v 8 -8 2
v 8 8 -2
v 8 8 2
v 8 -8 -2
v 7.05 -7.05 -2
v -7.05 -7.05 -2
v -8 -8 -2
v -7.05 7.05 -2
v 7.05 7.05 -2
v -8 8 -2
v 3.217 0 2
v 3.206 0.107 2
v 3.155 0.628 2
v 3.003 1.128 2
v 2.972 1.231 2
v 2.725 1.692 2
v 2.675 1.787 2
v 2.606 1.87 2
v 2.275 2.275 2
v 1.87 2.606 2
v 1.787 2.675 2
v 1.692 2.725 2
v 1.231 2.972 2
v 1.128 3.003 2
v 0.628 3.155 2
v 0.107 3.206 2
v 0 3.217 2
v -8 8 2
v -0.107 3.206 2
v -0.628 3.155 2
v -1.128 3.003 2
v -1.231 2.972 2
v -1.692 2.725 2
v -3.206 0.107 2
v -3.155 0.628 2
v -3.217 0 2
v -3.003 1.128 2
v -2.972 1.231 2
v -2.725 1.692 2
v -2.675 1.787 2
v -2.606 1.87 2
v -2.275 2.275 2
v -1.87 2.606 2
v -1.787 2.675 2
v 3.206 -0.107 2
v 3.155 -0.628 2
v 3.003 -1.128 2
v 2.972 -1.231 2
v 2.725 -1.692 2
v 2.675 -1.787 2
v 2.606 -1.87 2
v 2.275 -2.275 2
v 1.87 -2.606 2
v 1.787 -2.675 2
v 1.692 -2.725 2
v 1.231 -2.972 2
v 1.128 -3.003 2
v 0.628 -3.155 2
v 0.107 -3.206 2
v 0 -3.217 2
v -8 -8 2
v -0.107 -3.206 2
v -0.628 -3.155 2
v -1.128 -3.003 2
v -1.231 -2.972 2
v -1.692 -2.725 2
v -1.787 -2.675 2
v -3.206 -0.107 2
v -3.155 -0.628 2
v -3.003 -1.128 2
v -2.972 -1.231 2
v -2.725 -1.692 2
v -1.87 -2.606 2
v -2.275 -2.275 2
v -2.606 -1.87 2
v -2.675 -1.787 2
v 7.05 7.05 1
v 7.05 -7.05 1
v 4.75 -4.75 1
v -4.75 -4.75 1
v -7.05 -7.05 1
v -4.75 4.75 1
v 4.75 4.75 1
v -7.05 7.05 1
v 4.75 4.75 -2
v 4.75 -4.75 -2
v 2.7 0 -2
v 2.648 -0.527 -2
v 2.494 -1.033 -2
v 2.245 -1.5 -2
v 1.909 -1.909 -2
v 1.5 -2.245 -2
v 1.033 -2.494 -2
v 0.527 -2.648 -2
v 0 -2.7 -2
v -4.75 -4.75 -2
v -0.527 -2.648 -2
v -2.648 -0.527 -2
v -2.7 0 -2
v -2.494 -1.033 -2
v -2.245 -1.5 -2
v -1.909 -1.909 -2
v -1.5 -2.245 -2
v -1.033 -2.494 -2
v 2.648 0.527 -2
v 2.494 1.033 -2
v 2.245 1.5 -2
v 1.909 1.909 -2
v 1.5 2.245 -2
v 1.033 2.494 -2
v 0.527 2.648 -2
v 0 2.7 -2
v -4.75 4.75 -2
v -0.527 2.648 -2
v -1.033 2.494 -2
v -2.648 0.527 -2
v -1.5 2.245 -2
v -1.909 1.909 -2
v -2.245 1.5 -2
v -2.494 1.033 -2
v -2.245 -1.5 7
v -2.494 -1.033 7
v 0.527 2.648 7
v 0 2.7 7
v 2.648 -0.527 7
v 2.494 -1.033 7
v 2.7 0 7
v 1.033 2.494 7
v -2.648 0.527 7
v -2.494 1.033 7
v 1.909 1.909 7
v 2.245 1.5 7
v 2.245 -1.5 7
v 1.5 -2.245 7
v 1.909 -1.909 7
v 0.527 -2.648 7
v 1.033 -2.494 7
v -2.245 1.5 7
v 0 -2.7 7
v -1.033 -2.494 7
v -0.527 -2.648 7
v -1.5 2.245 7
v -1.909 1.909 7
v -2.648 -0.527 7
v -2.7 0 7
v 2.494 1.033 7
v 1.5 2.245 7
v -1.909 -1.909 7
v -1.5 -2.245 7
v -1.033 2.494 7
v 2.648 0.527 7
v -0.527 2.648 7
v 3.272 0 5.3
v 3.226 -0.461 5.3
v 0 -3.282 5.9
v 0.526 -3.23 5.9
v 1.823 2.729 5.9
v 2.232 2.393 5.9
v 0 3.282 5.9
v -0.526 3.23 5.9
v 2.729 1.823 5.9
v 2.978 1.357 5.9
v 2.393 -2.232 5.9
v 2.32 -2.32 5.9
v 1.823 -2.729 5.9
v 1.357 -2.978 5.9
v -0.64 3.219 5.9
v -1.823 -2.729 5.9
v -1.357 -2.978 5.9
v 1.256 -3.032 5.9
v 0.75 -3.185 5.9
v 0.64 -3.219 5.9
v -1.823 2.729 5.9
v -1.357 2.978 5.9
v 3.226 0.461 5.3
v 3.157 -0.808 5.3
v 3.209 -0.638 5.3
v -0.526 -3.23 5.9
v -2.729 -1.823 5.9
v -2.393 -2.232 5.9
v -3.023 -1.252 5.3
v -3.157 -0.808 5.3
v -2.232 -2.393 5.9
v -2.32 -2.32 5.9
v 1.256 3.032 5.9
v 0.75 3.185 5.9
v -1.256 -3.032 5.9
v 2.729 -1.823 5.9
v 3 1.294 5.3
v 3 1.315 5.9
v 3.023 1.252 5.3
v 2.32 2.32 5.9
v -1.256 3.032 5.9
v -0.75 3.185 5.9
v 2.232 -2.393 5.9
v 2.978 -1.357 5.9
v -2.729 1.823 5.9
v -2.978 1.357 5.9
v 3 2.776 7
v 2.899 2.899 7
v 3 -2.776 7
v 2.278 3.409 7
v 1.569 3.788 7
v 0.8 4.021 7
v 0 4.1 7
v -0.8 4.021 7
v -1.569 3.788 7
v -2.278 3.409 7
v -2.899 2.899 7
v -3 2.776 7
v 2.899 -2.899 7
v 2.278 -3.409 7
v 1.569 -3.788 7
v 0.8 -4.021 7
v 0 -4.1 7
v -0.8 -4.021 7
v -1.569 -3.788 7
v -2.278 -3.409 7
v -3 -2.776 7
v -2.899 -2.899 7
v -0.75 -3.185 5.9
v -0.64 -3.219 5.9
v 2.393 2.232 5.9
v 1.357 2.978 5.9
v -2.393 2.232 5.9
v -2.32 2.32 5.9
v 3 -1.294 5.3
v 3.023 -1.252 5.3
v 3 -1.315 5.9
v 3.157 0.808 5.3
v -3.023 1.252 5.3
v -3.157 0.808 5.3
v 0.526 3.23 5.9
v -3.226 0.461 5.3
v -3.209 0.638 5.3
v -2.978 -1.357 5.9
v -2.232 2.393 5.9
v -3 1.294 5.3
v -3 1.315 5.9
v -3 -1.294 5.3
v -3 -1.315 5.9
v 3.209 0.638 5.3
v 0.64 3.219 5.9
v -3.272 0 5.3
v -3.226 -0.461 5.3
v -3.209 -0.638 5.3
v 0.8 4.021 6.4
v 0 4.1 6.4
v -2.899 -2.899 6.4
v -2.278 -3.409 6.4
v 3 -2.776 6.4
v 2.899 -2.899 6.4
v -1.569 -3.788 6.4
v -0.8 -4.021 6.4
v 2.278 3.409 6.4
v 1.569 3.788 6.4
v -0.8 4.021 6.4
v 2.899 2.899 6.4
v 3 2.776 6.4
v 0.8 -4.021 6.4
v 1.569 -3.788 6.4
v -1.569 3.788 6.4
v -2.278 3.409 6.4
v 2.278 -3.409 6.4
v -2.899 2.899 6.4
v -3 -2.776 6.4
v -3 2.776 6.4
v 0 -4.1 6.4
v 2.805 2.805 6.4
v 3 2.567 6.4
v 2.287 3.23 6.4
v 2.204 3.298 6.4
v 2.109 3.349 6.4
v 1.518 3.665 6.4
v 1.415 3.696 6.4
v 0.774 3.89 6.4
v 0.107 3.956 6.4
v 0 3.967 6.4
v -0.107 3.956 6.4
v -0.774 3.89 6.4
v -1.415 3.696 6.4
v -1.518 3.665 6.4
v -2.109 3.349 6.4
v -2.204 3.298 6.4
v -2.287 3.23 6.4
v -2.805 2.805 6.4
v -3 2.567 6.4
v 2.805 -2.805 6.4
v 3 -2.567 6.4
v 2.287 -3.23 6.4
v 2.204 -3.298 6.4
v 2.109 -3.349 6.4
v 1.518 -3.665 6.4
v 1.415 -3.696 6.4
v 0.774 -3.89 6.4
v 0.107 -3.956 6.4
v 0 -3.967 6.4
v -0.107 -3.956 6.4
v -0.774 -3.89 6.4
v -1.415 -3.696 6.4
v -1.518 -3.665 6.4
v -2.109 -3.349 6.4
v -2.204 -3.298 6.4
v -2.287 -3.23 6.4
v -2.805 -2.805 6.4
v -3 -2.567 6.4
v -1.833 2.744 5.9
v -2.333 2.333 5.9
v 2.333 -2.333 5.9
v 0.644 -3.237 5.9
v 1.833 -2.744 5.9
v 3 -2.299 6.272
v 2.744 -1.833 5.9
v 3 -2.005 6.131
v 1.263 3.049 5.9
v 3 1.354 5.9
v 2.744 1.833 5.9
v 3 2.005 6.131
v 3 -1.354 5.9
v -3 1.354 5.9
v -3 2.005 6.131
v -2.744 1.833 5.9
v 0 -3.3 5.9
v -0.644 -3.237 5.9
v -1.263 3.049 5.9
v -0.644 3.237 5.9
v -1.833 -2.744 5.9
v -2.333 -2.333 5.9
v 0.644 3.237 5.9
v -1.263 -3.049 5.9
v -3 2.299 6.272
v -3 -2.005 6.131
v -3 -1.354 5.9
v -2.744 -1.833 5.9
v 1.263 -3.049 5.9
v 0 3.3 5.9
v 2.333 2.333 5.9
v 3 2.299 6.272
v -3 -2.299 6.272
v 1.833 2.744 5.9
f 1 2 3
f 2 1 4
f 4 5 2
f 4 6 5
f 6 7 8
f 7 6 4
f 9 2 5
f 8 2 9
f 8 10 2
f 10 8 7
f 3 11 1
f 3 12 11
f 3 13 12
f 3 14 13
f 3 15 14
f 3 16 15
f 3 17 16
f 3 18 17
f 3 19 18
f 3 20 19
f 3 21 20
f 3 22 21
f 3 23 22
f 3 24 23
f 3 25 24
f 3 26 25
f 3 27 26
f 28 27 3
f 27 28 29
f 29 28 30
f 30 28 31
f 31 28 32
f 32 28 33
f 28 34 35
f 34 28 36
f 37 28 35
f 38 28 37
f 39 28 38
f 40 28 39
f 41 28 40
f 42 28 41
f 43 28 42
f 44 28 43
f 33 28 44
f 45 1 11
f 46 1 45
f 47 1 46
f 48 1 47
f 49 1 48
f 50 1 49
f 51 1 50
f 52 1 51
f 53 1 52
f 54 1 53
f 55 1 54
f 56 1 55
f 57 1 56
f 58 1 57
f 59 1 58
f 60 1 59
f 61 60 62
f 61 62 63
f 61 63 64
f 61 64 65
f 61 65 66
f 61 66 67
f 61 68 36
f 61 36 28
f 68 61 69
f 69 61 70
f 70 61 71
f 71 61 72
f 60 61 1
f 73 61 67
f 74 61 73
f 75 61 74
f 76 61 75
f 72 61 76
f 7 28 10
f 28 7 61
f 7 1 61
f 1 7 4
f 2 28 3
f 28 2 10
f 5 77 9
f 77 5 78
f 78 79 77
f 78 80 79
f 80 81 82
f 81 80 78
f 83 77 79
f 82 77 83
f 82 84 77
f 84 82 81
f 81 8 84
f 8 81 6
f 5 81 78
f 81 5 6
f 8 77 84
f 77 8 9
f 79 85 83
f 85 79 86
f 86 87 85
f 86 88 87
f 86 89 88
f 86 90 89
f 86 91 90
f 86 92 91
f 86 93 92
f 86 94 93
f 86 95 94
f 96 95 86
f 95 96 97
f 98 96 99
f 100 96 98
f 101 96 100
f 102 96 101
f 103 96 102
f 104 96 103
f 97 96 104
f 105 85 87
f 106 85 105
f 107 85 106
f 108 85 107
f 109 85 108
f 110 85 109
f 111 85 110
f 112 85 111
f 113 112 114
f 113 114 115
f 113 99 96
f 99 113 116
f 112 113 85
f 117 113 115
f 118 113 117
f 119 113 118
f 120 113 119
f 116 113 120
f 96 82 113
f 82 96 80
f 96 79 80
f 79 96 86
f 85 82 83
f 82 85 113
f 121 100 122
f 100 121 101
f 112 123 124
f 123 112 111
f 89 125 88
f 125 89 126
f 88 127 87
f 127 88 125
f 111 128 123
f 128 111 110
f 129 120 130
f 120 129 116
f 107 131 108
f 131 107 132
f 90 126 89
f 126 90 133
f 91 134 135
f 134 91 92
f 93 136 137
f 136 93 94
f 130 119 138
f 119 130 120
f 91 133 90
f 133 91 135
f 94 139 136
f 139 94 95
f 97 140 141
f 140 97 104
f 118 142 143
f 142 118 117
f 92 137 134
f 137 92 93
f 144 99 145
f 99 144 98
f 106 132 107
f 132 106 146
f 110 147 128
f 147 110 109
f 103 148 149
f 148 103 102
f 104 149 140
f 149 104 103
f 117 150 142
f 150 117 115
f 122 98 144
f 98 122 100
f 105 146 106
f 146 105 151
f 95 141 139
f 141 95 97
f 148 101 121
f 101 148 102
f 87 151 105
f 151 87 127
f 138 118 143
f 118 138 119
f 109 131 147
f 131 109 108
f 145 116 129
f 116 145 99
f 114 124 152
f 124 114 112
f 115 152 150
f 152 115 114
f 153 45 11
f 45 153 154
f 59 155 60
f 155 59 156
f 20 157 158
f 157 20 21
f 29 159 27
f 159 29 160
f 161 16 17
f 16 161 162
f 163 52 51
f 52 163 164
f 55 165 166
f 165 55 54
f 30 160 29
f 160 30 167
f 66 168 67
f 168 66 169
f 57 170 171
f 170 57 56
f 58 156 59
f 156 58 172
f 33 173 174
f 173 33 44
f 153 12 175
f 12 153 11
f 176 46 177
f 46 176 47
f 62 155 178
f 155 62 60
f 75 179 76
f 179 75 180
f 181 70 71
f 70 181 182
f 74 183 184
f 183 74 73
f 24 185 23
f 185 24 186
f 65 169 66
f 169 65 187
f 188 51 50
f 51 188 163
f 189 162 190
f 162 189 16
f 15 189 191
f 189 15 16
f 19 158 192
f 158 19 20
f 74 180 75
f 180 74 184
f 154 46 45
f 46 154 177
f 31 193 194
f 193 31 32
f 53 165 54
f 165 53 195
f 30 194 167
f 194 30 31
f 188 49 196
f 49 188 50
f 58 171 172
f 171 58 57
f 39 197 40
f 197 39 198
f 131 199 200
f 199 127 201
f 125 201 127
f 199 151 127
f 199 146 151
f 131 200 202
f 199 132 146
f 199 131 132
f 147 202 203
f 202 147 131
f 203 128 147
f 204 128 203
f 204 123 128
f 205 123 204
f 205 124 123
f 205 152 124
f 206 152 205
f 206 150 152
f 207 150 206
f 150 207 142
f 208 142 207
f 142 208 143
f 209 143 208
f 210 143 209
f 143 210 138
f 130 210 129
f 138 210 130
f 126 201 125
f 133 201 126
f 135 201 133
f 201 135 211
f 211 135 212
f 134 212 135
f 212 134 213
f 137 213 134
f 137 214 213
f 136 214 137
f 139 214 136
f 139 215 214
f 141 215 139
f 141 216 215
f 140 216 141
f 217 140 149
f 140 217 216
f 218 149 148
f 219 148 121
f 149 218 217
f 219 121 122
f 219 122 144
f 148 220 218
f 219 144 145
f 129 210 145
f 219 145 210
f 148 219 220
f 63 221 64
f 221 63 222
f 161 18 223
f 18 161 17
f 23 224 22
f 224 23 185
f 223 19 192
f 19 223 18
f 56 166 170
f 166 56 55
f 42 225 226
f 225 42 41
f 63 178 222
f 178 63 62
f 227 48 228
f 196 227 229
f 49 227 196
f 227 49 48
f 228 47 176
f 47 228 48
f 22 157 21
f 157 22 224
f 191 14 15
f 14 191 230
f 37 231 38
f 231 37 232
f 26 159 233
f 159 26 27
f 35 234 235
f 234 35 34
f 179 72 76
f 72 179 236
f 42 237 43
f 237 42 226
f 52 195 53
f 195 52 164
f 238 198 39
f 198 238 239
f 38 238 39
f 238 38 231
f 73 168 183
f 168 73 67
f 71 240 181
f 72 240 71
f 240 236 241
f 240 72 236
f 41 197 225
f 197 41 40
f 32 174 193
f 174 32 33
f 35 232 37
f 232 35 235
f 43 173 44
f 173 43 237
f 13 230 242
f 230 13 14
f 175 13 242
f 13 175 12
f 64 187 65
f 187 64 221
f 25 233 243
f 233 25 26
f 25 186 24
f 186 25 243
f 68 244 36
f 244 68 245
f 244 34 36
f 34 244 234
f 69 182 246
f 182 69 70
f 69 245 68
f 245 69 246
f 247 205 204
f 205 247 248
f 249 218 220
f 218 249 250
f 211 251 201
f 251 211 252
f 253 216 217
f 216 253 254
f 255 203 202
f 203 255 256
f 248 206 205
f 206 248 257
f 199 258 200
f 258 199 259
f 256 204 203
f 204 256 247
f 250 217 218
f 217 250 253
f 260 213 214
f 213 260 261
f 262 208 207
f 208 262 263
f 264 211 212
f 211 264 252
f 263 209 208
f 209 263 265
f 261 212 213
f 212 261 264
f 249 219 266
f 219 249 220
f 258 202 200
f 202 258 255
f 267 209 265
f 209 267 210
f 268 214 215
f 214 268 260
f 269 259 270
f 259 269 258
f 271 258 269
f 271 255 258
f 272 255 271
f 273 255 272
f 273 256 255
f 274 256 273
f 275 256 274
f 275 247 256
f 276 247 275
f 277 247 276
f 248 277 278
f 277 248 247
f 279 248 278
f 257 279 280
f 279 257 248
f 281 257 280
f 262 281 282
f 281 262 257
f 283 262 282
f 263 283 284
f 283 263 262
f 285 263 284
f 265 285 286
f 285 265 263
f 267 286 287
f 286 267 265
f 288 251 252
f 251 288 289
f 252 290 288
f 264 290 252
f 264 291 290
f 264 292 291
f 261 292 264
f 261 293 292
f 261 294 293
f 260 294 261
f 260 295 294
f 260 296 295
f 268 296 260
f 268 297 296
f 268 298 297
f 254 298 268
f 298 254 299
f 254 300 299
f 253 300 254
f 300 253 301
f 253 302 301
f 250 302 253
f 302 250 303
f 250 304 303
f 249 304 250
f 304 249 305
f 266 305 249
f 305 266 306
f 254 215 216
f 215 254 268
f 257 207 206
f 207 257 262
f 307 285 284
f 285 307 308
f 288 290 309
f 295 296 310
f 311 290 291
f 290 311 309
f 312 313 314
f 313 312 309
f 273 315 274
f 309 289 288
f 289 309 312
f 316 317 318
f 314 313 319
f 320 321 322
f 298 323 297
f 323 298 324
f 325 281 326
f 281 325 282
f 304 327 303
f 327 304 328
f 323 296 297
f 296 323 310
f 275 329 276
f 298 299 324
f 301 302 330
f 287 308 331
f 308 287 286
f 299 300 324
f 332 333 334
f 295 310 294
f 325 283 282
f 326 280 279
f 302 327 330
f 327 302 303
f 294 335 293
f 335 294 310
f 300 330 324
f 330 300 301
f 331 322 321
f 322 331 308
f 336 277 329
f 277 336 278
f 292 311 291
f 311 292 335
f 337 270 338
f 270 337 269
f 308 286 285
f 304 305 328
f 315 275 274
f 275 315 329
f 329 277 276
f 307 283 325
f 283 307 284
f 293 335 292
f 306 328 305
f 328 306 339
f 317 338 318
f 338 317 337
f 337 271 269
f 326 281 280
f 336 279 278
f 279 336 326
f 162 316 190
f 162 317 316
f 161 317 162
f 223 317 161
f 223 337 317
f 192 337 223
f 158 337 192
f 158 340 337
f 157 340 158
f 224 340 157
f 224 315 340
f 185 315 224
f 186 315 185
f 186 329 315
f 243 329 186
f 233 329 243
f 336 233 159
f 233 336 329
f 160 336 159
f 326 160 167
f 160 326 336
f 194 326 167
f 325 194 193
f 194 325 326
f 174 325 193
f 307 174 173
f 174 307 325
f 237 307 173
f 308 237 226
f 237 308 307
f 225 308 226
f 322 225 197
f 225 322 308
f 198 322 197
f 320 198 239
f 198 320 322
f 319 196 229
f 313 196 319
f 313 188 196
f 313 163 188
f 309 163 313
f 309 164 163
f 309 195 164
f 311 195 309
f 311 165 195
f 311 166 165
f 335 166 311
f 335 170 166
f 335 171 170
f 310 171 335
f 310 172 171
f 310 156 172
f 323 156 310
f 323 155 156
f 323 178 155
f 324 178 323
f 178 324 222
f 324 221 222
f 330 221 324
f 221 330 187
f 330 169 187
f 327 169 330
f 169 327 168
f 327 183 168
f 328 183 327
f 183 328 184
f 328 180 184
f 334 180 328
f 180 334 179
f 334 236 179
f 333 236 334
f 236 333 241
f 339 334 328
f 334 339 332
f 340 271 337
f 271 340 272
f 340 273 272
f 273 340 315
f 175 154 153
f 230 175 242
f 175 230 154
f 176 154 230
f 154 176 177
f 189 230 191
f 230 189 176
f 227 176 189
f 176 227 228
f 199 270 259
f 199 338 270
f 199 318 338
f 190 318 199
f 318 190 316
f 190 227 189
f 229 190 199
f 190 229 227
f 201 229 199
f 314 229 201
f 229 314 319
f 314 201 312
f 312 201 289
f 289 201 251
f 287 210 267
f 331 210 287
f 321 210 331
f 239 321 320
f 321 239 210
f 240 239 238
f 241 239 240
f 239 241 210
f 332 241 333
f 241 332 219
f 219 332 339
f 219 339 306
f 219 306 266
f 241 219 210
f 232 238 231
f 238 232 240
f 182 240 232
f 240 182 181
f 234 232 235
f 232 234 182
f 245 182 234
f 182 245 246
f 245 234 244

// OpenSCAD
module cap(d,t) {
  difference() {
      cube([d+t+2,d+t+2,t],center=true);
      translate([0,0,2])
       cube([d+4.1,d+4.1,t+2],center=true);
  }
  cube([d-0.5,d-0.5,t],center=true);
}

module luer(off) {// luer connection
 $fn=32;
 Rin=1.5;
 Rout=2.1;
 

 difference(){
	union(){
		translate([0,0,-off]) cylinder(r1=6.6/2,r2=6.4/2,h=6);
		translate([0,0,-off]) cylinder(r=8.2/2,h=0.6);
      translate([0,0,-off+0.5]) cylinder(r1=8.2/2,r2=6.6/2,h=0.6);
	}
	//inside
	translate([0,0,-off-0.1]) cylinder(r=2.7,h=7);
	translate([0,0,-5.1]) cylinder(r1=2.7,r2=Rin,h=5.2);
	//notches
	translate([6.0/2,-8.5/2,-off-0.1]) cube([1.3,8.5,1.8]);
	translate([-6.0/2-1.3,-8.5/2,-off-0.1]) cube([1.3,8.5,1.8]);
 }
}


module flow(d,t,rad) {
    difference() {
          cap(d,t);
          cylinder(r=rad,h=2*t,center=true,$fn=32);
    }
    luer(7);
}

//cap(10,4);
rotate([180,0,0]) flow(10,4,2.7);
